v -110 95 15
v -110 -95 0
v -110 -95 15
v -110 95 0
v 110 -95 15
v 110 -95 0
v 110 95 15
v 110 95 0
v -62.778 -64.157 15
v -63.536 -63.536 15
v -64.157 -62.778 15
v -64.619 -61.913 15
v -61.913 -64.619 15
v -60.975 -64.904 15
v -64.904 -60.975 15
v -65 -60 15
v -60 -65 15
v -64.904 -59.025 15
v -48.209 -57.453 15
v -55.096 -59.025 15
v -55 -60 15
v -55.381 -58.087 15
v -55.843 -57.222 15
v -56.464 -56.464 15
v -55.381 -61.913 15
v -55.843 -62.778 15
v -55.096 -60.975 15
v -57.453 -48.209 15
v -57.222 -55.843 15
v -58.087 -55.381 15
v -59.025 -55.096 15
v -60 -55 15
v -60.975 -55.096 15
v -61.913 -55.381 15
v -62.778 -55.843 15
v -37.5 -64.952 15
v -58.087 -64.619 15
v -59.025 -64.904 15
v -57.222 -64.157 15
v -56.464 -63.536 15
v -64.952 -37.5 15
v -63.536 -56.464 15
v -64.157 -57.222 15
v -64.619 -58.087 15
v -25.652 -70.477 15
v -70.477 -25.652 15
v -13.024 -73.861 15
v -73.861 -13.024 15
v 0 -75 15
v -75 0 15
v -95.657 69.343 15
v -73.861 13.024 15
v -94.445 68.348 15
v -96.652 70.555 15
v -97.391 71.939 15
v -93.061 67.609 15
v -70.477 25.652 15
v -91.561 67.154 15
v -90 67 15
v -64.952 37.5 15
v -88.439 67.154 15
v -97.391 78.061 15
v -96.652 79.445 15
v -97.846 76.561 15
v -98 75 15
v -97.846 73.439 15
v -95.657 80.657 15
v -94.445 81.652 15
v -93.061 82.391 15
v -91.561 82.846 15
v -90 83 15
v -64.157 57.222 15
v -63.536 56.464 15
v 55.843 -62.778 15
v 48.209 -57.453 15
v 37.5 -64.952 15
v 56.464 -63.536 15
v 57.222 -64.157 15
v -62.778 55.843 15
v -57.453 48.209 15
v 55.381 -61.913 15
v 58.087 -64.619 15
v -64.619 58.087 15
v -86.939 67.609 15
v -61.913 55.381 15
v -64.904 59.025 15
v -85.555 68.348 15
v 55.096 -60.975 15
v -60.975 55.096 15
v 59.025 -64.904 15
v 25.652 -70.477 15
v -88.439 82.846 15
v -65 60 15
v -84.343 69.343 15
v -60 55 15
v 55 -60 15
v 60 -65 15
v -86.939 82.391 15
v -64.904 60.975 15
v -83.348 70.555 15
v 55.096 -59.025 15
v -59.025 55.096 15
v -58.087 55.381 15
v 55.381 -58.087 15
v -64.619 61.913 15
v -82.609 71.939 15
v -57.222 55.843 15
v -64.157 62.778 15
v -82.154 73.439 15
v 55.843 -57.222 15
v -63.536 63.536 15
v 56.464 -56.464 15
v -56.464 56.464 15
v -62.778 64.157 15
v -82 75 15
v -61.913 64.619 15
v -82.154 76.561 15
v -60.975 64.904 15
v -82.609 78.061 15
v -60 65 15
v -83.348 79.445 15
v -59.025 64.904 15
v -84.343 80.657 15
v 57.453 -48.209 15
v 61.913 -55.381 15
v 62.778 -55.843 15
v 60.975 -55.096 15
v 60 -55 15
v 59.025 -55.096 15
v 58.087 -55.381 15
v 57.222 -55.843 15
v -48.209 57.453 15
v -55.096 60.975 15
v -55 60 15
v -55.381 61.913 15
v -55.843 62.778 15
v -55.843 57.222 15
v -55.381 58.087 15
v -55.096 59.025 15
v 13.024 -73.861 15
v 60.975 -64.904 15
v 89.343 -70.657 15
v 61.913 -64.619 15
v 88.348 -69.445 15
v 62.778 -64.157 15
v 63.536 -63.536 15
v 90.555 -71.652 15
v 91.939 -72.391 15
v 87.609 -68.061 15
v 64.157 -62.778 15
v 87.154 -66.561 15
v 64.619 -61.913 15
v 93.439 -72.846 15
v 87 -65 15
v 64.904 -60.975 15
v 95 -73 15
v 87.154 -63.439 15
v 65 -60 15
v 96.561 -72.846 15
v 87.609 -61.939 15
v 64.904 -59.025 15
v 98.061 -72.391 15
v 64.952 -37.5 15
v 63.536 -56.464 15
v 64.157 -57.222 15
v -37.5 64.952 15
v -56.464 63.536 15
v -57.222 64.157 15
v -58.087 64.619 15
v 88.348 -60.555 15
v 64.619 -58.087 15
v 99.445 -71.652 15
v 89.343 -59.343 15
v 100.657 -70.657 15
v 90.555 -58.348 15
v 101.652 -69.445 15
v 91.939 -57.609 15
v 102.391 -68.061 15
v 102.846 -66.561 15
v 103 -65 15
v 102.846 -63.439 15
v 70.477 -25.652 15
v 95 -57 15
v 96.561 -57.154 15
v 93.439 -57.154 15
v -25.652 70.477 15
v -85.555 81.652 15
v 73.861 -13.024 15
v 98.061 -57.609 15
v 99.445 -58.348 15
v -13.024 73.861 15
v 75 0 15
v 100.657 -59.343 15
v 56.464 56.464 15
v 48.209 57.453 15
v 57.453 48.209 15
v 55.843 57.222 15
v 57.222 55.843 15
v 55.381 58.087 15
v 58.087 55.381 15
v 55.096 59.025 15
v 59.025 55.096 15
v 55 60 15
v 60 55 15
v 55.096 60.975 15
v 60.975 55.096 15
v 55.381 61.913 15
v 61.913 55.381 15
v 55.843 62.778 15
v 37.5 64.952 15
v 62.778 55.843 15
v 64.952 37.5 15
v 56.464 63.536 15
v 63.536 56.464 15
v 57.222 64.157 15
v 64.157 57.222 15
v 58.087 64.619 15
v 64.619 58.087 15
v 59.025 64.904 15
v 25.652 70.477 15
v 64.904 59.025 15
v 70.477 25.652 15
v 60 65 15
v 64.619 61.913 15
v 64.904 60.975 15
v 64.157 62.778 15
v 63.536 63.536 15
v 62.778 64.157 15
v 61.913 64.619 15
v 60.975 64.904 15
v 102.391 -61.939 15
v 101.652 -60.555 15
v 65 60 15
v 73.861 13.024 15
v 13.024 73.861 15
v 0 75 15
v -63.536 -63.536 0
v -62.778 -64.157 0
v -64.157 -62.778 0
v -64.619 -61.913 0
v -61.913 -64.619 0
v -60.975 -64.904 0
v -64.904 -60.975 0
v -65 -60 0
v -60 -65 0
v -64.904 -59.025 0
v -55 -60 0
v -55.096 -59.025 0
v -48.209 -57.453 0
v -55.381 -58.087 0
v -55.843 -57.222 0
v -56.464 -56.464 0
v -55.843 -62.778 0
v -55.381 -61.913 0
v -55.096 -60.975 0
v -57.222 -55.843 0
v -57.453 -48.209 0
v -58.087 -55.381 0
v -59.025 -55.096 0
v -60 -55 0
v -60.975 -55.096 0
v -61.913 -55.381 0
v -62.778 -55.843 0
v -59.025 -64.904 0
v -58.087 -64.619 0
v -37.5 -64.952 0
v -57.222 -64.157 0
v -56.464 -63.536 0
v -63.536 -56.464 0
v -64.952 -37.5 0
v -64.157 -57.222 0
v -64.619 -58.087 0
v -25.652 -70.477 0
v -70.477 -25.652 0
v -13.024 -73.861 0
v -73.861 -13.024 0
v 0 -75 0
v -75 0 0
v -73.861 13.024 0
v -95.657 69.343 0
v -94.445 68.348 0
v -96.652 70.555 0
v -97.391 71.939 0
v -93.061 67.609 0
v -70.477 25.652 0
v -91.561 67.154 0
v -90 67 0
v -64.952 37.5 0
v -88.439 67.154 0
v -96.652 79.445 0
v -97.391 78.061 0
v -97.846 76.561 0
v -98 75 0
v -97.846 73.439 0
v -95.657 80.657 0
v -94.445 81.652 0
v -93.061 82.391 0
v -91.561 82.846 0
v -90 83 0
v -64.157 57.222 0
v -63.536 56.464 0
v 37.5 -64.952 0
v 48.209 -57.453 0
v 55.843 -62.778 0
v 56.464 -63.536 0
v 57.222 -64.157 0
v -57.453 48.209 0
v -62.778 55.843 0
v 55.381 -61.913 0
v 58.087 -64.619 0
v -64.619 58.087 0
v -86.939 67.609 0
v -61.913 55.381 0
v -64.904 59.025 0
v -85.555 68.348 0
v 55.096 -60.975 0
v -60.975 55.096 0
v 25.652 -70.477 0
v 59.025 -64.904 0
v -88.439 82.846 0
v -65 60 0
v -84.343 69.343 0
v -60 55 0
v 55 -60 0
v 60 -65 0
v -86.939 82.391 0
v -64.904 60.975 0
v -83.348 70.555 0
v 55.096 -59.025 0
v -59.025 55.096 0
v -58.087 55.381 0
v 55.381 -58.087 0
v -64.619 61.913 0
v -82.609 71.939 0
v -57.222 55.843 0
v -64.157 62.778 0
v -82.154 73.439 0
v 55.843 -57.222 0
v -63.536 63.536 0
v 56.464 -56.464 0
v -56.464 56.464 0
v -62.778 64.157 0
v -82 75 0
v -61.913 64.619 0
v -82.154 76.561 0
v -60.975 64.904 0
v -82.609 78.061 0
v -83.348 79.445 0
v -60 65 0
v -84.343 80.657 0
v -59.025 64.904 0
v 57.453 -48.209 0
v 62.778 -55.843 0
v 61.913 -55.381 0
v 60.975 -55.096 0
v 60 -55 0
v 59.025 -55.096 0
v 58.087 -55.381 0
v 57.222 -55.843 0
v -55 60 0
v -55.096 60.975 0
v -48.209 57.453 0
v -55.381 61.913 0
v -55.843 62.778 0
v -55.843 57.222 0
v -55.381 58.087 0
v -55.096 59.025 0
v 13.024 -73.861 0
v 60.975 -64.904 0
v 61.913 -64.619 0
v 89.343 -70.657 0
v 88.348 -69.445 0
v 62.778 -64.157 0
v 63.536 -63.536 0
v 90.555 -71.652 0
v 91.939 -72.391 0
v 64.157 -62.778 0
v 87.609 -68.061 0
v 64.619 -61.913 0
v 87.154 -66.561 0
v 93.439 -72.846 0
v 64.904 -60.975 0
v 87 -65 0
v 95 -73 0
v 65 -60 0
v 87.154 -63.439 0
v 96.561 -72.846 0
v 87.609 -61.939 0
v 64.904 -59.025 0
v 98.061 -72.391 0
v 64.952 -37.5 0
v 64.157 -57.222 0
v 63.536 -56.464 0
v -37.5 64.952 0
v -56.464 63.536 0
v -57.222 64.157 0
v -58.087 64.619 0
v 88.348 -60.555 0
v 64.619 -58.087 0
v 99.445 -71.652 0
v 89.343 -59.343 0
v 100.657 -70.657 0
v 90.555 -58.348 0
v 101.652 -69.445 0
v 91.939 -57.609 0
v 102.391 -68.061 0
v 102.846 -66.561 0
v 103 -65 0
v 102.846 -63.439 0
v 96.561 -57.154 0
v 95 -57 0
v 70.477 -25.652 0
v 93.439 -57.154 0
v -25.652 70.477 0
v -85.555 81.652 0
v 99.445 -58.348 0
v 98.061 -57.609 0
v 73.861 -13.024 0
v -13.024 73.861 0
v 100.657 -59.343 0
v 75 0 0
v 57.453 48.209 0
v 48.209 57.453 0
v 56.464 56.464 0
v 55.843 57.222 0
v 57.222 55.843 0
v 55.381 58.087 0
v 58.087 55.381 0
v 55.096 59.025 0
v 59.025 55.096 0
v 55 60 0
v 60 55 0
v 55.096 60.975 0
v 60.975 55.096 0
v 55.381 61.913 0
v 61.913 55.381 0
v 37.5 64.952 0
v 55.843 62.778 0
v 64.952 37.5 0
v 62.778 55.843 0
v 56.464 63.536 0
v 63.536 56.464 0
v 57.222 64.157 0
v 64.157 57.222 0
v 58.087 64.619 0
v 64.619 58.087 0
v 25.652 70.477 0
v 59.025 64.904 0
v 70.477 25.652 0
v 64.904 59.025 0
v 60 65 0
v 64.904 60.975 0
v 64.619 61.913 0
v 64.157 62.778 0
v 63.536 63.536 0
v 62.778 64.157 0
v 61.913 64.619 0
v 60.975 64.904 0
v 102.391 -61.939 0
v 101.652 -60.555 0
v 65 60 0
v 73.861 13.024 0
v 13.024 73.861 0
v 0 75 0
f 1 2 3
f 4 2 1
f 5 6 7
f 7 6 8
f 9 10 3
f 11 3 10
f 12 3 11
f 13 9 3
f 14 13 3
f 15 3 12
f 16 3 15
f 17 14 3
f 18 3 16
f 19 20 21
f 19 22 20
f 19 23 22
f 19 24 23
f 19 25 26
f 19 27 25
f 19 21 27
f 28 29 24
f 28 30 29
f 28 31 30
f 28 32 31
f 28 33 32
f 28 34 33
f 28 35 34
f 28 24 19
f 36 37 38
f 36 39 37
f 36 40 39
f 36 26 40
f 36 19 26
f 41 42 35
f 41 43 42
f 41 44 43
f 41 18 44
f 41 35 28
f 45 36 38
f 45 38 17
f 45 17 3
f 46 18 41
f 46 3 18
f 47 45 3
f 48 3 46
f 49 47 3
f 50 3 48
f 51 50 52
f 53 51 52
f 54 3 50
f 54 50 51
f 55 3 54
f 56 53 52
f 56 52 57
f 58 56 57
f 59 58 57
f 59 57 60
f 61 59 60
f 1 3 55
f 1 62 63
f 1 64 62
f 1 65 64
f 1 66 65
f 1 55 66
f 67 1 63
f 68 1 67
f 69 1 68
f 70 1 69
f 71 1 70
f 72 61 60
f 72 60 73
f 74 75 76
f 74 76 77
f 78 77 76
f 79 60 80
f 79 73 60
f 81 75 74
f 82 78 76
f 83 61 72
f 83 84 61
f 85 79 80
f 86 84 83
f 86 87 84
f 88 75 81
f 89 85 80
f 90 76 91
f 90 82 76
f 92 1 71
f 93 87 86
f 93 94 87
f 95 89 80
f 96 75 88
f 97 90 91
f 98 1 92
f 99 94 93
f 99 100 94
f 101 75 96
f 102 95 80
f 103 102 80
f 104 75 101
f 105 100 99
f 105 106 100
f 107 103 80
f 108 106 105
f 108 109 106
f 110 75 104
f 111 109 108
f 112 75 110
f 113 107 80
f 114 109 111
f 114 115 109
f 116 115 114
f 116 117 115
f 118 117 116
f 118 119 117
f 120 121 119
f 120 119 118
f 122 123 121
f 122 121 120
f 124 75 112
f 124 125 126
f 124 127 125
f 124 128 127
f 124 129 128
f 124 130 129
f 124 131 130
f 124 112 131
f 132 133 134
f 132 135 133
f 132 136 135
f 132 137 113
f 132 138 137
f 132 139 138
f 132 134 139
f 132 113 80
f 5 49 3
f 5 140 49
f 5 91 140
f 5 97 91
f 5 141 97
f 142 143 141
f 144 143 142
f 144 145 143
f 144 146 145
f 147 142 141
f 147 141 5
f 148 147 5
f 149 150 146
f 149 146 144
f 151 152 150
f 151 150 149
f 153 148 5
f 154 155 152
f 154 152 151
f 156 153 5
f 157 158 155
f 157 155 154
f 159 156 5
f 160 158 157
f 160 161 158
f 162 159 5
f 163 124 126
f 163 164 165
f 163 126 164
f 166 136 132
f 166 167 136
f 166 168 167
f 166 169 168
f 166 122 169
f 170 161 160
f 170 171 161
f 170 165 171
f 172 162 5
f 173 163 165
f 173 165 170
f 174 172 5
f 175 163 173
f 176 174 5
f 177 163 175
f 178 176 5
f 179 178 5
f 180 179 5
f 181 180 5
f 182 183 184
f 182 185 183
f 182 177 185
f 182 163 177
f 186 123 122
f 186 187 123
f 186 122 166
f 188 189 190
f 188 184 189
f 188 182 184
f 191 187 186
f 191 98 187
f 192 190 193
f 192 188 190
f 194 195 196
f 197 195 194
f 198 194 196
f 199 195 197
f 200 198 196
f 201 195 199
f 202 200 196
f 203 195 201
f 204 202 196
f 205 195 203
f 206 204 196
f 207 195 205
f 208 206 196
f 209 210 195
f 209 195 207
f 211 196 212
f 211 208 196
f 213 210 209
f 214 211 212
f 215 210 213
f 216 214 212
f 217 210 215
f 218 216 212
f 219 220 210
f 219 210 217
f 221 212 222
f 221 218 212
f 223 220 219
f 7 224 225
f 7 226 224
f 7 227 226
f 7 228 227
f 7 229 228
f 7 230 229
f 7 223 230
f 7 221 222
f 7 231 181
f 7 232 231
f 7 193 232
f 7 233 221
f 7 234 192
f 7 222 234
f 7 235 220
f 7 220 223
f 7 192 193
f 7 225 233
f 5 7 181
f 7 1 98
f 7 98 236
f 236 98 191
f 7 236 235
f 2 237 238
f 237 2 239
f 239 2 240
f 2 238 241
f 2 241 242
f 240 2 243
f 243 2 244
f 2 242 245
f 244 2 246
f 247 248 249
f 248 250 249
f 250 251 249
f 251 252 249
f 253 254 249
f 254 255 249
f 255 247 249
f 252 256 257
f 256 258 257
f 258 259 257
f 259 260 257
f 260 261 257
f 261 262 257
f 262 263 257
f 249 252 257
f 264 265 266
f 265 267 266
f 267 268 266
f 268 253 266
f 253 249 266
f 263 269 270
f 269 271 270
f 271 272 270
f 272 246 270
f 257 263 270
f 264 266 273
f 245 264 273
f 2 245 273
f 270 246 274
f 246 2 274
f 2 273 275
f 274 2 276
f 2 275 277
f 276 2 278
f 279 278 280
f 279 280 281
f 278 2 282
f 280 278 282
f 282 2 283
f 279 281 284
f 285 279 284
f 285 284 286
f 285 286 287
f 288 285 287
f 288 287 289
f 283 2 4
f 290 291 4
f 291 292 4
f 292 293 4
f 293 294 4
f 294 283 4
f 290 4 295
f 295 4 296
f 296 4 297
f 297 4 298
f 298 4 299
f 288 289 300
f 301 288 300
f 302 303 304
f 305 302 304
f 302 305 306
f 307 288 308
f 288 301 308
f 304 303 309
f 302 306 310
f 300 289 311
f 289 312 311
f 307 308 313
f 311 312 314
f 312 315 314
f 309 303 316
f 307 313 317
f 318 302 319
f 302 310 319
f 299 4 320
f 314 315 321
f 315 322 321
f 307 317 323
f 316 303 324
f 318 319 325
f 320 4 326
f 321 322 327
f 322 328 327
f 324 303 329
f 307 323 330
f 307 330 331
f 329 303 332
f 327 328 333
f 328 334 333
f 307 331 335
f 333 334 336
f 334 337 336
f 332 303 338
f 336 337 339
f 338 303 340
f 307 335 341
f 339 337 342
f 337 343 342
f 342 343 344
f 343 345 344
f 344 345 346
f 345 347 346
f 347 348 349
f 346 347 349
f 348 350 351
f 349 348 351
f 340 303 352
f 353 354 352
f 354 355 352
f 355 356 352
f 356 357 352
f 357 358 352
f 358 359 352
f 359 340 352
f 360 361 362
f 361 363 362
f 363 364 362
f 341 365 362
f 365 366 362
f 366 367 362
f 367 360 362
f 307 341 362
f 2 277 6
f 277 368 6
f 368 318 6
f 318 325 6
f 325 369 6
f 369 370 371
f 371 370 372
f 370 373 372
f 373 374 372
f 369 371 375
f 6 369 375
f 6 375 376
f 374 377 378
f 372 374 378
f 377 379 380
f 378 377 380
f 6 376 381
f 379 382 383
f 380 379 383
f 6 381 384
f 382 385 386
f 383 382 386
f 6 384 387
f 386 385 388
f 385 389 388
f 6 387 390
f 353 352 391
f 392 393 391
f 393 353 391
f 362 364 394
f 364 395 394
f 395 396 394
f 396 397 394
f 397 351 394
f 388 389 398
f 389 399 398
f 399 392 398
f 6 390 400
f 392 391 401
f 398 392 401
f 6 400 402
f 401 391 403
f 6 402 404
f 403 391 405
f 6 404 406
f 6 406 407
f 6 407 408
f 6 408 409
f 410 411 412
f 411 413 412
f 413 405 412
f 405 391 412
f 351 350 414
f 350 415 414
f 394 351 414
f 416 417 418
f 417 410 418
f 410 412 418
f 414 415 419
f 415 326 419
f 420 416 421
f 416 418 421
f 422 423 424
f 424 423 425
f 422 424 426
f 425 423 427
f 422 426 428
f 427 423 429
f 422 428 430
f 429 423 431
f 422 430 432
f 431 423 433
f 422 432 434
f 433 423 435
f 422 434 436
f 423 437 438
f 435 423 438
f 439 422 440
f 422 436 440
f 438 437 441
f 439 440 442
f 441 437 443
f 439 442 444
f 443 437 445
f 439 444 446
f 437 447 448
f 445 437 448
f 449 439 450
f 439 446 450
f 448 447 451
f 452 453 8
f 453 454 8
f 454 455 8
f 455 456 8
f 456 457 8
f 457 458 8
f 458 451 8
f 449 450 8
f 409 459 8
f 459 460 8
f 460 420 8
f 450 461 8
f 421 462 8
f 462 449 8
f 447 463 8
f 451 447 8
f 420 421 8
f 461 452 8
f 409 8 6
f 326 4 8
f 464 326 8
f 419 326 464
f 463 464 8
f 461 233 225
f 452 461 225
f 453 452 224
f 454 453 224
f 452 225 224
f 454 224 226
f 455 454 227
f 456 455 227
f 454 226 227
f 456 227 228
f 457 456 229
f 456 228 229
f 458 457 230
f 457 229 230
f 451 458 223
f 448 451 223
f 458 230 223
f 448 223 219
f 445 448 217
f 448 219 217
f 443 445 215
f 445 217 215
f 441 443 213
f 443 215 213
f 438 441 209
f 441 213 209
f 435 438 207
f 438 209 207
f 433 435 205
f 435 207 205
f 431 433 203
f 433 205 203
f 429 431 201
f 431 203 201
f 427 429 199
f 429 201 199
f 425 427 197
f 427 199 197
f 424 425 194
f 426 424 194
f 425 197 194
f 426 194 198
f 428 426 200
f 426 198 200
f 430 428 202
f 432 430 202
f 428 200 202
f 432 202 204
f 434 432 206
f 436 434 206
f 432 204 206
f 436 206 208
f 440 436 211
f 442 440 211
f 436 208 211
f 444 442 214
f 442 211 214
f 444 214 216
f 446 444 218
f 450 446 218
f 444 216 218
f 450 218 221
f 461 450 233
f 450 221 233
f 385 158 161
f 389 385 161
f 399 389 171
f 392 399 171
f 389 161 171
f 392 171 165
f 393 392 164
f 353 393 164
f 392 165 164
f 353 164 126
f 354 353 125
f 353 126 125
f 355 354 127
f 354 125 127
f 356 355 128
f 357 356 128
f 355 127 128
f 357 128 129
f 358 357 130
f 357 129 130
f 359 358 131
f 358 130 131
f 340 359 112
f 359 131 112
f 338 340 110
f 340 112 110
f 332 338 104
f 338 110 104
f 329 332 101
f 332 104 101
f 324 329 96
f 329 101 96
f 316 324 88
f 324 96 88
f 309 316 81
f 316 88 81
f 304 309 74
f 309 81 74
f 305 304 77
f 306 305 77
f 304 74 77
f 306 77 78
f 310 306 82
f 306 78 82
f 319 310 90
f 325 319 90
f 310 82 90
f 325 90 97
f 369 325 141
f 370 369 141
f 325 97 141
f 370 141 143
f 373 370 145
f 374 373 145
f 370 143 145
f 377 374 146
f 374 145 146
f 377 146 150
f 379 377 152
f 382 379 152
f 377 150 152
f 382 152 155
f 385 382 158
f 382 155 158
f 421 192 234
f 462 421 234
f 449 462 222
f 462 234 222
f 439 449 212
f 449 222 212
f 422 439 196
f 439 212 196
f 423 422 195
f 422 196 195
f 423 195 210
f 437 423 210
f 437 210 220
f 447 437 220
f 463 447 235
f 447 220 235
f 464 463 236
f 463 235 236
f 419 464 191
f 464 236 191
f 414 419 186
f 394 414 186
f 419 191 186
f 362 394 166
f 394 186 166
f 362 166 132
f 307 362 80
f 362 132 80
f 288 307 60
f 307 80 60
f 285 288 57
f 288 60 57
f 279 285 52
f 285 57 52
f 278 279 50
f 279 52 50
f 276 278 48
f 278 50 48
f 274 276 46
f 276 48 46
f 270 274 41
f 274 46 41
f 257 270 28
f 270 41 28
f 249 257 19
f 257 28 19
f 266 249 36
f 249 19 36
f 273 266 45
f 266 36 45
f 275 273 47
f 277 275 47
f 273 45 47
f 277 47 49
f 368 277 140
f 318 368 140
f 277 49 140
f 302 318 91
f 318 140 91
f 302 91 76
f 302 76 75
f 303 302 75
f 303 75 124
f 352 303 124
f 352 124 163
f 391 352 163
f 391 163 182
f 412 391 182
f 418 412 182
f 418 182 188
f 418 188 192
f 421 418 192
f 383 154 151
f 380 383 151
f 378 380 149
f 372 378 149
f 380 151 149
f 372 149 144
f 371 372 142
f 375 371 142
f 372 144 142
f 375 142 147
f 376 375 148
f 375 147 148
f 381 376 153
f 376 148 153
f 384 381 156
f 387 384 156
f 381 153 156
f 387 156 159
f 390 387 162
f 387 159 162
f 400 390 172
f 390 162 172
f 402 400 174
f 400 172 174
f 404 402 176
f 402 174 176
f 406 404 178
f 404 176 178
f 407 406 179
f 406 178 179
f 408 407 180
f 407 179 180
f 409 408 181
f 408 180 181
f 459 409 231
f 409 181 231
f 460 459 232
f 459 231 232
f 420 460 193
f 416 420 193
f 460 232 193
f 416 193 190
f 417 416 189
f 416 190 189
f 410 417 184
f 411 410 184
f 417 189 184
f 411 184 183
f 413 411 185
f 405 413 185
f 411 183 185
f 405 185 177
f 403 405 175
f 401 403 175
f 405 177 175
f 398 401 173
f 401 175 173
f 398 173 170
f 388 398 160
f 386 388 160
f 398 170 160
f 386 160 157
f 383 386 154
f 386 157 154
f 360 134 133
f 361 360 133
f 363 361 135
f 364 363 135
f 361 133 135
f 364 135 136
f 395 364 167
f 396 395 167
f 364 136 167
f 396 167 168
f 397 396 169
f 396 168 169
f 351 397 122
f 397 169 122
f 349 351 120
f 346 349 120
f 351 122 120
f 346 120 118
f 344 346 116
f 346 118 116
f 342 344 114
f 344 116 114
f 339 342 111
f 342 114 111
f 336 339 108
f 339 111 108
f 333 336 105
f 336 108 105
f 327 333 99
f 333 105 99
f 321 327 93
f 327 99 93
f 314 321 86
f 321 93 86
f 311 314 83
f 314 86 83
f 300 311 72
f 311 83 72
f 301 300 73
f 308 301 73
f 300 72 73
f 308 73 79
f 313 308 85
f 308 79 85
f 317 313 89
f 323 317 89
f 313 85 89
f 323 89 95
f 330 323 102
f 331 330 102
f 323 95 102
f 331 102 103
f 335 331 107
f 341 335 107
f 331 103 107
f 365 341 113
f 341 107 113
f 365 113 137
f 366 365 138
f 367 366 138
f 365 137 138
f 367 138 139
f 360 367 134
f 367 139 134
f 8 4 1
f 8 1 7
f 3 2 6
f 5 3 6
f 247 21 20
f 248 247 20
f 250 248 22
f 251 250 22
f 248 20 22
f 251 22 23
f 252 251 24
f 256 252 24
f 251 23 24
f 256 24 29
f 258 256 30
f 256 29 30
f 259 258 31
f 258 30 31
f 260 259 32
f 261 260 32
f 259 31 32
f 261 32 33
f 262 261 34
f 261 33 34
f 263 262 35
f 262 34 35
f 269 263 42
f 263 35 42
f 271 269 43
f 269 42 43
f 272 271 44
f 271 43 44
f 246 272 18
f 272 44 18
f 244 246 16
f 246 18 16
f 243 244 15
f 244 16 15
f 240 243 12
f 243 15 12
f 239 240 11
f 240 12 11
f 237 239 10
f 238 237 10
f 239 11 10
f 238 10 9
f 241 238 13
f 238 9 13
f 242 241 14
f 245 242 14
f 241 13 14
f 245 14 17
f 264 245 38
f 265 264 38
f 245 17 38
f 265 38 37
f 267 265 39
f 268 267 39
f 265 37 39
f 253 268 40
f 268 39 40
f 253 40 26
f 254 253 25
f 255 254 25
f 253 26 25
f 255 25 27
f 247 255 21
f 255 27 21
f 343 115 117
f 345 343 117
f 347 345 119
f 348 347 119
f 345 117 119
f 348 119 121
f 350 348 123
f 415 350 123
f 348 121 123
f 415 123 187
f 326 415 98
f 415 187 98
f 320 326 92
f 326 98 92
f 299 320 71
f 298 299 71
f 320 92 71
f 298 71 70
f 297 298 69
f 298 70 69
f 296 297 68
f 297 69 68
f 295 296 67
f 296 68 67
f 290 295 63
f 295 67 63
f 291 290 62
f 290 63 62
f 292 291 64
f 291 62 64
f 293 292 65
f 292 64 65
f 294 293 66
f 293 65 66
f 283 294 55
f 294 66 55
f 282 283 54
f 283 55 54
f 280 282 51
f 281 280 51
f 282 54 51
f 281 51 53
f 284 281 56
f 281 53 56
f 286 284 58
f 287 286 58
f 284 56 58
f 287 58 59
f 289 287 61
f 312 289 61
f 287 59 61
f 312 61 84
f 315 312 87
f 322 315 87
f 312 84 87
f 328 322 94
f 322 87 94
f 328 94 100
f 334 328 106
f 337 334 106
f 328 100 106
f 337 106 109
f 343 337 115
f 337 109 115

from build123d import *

# Parameters (mm, degrees)
SKETCH1_W           = 220
SKETCH1_H           = 190
BOSS_EXTRUDE1_DEPTH = 15
SKETCH2_R           = 75
SKETCH2_R_2         = 8
SKETCH2_R_3         = 5
CUT_EXTRUDE1_DEPTH  = 15


with BuildPart() as part:
    # Sketch1 → Boss-Extrude1 (new body)
    with BuildSketch(Plane.XY):
        Rectangle(SKETCH1_W, SKETCH1_H)
    extrude(amount=BOSS_EXTRUDE1_DEPTH)

    # Sketch2 → Cut-Extrude1 (cut)
    with BuildSketch(Plane.XY.offset(15)):
        Circle(SKETCH2_R)
        with Locations((-90, 75)):
            Circle(SKETCH2_R_2)
        with Locations(Location((95, -65, 0), (0, 0, 180))):
            Circle(SKETCH2_R_2)
        with Locations((-60, 60)):
            Circle(SKETCH2_R_3)
        with Locations((60, 60)):
            Circle(SKETCH2_R_3)
        with Locations((60, -60)):
            Circle(SKETCH2_R_3)
        with Locations((-60, -60)):
            Circle(SKETCH2_R_3)
    extrude(amount=-CUT_EXTRUDE1_DEPTH, mode=Mode.SUBTRACT)


solid = part.part
